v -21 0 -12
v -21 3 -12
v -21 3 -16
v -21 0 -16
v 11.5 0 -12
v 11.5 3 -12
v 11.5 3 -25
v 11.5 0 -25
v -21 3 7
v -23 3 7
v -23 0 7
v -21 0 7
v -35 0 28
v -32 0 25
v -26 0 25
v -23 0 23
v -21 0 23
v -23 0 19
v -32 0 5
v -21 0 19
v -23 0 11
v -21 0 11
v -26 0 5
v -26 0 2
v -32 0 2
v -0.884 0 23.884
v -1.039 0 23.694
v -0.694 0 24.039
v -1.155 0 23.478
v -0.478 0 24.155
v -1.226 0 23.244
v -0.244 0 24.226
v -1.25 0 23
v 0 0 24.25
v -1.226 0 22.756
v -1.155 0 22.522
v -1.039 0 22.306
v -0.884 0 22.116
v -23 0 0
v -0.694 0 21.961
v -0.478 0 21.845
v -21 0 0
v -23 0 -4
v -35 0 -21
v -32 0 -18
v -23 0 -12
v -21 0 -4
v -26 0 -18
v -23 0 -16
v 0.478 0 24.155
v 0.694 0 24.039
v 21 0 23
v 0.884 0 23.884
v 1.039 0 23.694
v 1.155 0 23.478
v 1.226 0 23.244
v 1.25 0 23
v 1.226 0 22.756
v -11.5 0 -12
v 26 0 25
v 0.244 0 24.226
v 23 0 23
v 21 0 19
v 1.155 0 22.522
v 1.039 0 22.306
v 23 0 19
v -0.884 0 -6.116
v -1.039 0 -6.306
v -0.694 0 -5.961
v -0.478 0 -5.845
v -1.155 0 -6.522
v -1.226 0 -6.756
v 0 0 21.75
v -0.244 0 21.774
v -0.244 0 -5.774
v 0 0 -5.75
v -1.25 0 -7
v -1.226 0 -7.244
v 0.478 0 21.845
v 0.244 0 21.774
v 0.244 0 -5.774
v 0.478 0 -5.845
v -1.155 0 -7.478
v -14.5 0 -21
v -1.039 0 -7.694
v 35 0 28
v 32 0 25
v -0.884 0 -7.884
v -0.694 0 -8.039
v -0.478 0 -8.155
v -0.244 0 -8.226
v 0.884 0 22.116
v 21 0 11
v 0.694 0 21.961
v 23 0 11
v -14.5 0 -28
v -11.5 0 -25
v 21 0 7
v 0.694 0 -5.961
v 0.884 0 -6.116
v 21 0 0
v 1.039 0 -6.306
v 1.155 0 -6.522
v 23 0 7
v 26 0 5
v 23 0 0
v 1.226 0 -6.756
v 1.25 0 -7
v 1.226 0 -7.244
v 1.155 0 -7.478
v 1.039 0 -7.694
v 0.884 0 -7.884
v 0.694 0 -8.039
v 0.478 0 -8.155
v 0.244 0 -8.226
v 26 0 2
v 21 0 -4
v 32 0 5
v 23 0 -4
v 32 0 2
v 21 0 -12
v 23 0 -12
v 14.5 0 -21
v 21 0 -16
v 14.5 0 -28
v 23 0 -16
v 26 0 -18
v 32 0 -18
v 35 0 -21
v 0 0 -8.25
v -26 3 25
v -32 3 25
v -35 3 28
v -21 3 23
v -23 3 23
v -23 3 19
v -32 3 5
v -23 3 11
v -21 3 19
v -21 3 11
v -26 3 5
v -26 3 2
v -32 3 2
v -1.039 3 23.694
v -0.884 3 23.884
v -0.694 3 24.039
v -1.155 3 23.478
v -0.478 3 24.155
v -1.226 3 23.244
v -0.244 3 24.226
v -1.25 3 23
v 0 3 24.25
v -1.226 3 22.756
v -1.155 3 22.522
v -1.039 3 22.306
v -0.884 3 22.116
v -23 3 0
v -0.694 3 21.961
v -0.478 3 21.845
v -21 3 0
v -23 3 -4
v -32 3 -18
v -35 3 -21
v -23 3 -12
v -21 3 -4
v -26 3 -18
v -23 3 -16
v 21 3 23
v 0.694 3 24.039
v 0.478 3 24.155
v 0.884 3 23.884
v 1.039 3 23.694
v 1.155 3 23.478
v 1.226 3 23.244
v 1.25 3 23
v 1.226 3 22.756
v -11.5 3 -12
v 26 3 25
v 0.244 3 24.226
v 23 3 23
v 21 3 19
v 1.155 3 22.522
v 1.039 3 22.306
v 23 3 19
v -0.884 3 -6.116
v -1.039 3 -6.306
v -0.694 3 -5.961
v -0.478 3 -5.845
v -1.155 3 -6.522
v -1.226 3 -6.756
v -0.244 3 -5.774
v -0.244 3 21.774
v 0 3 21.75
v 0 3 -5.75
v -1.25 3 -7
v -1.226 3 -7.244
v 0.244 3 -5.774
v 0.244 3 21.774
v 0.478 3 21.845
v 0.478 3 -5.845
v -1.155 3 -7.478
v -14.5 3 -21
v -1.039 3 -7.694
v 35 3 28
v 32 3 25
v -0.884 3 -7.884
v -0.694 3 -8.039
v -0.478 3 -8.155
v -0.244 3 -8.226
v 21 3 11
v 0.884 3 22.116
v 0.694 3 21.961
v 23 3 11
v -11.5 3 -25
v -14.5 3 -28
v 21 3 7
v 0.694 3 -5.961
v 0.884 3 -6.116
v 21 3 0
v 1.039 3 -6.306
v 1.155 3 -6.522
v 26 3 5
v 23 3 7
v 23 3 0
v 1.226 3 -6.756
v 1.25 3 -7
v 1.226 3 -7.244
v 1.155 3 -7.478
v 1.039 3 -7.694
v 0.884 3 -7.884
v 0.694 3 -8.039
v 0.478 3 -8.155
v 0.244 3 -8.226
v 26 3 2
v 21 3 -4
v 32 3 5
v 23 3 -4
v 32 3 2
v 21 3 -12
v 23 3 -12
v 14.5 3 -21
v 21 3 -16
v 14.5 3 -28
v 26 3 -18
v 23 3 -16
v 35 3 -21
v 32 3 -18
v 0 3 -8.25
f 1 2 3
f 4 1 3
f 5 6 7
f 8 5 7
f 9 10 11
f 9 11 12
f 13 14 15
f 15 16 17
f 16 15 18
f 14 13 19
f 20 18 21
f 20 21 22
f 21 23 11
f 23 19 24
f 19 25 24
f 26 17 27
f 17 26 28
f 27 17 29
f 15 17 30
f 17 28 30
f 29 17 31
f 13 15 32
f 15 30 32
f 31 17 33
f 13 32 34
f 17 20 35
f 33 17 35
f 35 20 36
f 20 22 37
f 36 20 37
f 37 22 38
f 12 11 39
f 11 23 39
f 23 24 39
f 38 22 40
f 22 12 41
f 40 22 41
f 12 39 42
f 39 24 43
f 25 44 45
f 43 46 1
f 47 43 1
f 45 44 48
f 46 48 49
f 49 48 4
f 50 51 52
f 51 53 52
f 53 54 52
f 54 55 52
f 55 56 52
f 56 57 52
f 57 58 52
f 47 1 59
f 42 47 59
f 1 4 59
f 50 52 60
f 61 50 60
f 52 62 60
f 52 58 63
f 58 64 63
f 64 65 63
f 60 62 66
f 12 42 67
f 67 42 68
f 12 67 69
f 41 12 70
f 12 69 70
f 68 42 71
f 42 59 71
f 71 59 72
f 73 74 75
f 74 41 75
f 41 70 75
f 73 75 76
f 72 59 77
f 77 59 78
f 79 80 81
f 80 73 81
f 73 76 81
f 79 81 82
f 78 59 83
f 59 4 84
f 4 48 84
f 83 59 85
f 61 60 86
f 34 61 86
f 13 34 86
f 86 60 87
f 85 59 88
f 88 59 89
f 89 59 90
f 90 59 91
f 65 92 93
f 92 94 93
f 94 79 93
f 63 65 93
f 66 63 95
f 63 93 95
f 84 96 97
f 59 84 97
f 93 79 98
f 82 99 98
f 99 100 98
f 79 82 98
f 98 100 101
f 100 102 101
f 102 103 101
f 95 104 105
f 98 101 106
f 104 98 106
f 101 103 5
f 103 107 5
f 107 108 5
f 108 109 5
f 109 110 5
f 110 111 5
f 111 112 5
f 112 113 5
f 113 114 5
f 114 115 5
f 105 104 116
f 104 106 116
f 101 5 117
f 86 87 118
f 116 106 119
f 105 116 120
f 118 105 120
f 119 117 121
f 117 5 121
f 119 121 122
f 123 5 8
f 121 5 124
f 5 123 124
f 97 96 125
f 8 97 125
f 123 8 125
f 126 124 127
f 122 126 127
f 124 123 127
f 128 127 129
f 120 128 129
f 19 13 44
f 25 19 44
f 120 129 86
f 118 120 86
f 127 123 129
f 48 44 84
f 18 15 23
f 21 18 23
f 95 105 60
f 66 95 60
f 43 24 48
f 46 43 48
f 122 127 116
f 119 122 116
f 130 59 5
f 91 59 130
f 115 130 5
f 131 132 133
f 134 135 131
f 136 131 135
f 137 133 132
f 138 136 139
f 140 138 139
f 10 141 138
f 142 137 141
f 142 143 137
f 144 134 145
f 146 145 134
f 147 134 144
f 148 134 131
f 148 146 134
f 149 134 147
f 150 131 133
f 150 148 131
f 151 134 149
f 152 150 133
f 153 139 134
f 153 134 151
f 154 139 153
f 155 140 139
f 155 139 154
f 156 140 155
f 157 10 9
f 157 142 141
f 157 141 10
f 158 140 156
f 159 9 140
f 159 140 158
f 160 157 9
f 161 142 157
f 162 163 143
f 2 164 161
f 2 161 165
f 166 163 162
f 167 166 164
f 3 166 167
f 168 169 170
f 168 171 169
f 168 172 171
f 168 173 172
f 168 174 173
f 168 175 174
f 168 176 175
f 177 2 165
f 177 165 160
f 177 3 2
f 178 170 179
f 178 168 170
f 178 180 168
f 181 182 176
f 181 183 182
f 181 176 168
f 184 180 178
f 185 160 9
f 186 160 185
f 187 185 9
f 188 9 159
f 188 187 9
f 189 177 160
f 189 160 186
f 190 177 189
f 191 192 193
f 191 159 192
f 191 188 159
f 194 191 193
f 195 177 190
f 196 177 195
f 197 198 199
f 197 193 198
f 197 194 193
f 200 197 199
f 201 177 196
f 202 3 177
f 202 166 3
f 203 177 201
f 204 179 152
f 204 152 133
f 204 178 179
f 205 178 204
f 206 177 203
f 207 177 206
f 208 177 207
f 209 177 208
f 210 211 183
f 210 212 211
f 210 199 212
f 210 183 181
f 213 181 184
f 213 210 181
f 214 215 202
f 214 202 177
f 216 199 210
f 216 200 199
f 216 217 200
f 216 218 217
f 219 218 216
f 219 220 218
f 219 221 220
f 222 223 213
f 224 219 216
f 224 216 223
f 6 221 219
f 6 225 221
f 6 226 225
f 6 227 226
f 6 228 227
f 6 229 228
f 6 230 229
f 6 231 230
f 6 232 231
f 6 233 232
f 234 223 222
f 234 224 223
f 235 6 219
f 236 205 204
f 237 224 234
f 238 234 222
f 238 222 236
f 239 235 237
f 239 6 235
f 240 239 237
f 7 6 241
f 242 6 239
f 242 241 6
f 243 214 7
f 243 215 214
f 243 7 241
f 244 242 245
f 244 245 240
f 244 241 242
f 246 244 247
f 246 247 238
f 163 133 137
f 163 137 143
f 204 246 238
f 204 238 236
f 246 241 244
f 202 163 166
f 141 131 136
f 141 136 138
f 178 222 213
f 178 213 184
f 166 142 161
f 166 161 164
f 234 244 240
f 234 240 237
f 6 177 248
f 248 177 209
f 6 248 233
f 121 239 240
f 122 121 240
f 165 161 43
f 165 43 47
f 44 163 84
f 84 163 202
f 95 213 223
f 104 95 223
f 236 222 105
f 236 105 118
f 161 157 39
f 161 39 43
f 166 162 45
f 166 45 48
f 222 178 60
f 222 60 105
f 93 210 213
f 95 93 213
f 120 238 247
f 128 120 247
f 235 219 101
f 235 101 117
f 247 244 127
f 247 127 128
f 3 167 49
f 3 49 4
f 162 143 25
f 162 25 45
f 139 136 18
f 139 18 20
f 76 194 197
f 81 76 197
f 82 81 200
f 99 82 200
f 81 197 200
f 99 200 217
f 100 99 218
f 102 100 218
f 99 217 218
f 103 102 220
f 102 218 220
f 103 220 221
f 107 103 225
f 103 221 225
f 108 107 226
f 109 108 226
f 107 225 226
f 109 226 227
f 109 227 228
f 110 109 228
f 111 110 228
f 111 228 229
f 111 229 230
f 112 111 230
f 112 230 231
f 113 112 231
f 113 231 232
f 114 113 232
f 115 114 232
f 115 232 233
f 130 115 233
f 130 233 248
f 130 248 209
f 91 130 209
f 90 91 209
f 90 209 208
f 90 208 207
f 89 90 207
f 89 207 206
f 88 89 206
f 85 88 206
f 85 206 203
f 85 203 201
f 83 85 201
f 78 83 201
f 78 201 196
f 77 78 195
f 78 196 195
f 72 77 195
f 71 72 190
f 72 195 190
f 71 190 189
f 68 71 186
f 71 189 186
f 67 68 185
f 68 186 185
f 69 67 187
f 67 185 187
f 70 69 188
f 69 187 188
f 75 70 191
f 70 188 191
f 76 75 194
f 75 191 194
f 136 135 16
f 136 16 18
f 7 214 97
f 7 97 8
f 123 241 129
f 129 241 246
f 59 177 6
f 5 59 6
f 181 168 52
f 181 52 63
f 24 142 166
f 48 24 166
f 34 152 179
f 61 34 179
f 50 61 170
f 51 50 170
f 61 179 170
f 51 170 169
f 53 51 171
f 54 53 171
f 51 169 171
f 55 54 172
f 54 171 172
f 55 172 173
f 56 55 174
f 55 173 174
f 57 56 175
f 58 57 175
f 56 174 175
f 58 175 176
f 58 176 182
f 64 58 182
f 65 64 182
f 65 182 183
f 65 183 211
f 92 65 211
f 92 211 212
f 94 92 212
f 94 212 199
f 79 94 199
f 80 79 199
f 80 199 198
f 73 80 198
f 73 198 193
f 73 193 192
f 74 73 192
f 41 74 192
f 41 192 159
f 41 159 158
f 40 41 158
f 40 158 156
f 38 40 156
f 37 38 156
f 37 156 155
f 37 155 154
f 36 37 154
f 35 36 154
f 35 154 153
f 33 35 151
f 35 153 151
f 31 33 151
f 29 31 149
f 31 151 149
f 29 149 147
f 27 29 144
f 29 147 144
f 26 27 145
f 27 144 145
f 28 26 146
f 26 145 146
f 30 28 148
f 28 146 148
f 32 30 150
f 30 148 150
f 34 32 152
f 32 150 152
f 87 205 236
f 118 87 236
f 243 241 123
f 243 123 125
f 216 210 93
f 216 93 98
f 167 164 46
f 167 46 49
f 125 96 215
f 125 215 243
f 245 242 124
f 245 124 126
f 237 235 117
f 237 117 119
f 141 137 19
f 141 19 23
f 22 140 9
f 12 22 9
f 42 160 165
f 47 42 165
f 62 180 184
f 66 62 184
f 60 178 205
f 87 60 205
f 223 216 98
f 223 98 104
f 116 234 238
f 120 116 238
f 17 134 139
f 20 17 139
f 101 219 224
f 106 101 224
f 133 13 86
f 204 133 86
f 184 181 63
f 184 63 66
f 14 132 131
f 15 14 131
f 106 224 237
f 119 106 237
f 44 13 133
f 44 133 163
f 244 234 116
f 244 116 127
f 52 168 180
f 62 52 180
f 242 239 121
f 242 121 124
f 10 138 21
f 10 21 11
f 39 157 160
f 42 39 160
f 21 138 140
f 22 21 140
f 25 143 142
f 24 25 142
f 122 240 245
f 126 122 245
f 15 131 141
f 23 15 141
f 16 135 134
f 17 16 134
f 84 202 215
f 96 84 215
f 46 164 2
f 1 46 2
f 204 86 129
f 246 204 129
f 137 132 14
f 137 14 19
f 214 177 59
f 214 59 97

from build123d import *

# Parameters (mm, degrees)
SKETCH_1_W          = 70
SKETCH_1_H          = 56
EXTRUDE_1_DEPTH     = 3
CUT_EXTRUDE_1_REACH = 46.922
SKETCH_2_R          = 1.25
SKETCH_2_W          = 23
SKETCH_2_H          = 13
SKETCH_2_W_2        = 6
SKETCH_2_H_2        = 20
SKETCH_2_W_3        = 2
SKETCH_2_H_3        = 4
SKETCH_2_W_4        = 20.5
SKETCH_2_H_4        = 7


with BuildPart() as part:
    # 草图1 → 凸台-拉伸1 (new body)
    with BuildSketch(Plane(origin=(0, 0, 0), x_dir=(1, 0, 0), z_dir=(0, 1, 0))):
        Rectangle(SKETCH_1_W, SKETCH_1_H)
    extrude(amount=EXTRUDE_1_DEPTH)

    # 草图2 → 切除-拉伸1 (cut, up to next)
    with BuildSketch(Plane(origin=(0, 3, 0), x_dir=(1, 0, 0), z_dir=(0, 1, 0)), mode=Mode.PRIVATE) as cut_extrude_1_sk1:
        with Locations(Location((0, 7, 0), (0, 0, 270))):
            Circle(SKETCH_2_R)
    cut_extrude_1_tool1 = extrude(cut_extrude_1_sk1.sketch, amount=-CUT_EXTRUDE_1_REACH, mode=Mode.PRIVATE) & part.part
    # 草图2 → 切除-拉伸1 (cut, up to next)
    with BuildSketch(Plane(origin=(0, 3, 0), x_dir=(1, 0, 0), z_dir=(0, 1, 0)), mode=Mode.PRIVATE) as cut_extrude_1_sk2:
        with Locations(Location((0, -23, 0), (0, 0, 270))):
            Circle(SKETCH_2_R)
    cut_extrude_1_tool2 = extrude(cut_extrude_1_sk2.sketch, amount=-CUT_EXTRUDE_1_REACH, mode=Mode.PRIVATE) & part.part
    # 草图2 → 切除-拉伸1 (cut, up to next)
    with BuildSketch(Plane(origin=(0, 3, 0), x_dir=(1, 0, 0), z_dir=(0, 1, 0)), mode=Mode.PRIVATE) as cut_extrude_1_sk3:
        with Locations((0, 18.5)):
            Rectangle(SKETCH_2_W, SKETCH_2_H)
    cut_extrude_1_tool3 = extrude(cut_extrude_1_sk3.sketch, amount=-CUT_EXTRUDE_1_REACH, mode=Mode.PRIVATE) & part.part
    # 草图2 → 切除-拉伸1 (cut, up to next)
    with BuildSketch(Plane(origin=(0, 3, 0), x_dir=(1, 0, 0), z_dir=(0, 1, 0)), mode=Mode.PRIVATE) as cut_extrude_1_sk4:
        with Locations((-29, -15)):
            Rectangle(SKETCH_2_W_2, SKETCH_2_H_2)
    cut_extrude_1_tool4 = extrude(cut_extrude_1_sk4.sketch, amount=-CUT_EXTRUDE_1_REACH, mode=Mode.PRIVATE) & part.part
    # 草图2 → 切除-拉伸1 (cut, up to next)
    with BuildSketch(Plane(origin=(0, 3, 0), x_dir=(1, 0, 0), z_dir=(0, 1, 0)), mode=Mode.PRIVATE) as cut_extrude_1_sk5:
        with Locations((-29, 8)):
            Rectangle(SKETCH_2_W_2, SKETCH_2_H_2)
    cut_extrude_1_tool5 = extrude(cut_extrude_1_sk5.sketch, amount=-CUT_EXTRUDE_1_REACH, mode=Mode.PRIVATE) & part.part
    # 草图2 → 切除-拉伸1 (cut, up to next)
    with BuildSketch(Plane(origin=(0, 3, 0), x_dir=(1, 0, 0), z_dir=(0, 1, 0)), mode=Mode.PRIVATE) as cut_extrude_1_sk6:
        with Locations((29, -15)):
            Rectangle(SKETCH_2_W_2, SKETCH_2_H_2)
    cut_extrude_1_tool6 = extrude(cut_extrude_1_sk6.sketch, amount=-CUT_EXTRUDE_1_REACH, mode=Mode.PRIVATE) & part.part
    # 草图2 → 切除-拉伸1 (cut, up to next)
    with BuildSketch(Plane(origin=(0, 3, 0), x_dir=(1, 0, 0), z_dir=(0, 1, 0)), mode=Mode.PRIVATE) as cut_extrude_1_sk7:
        with Locations((29, 8)):
            Rectangle(SKETCH_2_W_2, SKETCH_2_H_2)
    cut_extrude_1_tool7 = extrude(cut_extrude_1_sk7.sketch, amount=-CUT_EXTRUDE_1_REACH, mode=Mode.PRIVATE) & part.part
    # 草图2 → 切除-拉伸1 (cut, up to next)
    with BuildSketch(Plane(origin=(0, 3, 0), x_dir=(1, 0, 0), z_dir=(0, 1, 0)), mode=Mode.PRIVATE) as cut_extrude_1_sk8:
        with Locations((-22, 2)):
            Rectangle(SKETCH_2_W_3, SKETCH_2_H_3)
    cut_extrude_1_tool8 = extrude(cut_extrude_1_sk8.sketch, amount=-CUT_EXTRUDE_1_REACH, mode=Mode.PRIVATE) & part.part
    # 草图2 → 切除-拉伸1 (cut, up to next)
    with BuildSketch(Plane(origin=(0, 3, 0), x_dir=(1, 0, 0), z_dir=(0, 1, 0)), mode=Mode.PRIVATE) as cut_extrude_1_sk9:
        with Locations((-22, 14)):
            Rectangle(SKETCH_2_W_3, SKETCH_2_H_3)
    cut_extrude_1_tool9 = extrude(cut_extrude_1_sk9.sketch, amount=-CUT_EXTRUDE_1_REACH, mode=Mode.PRIVATE) & part.part
    # 草图2 → 切除-拉伸1 (cut, up to next)
    with BuildSketch(Plane(origin=(0, 3, 0), x_dir=(1, 0, 0), z_dir=(0, 1, 0)), mode=Mode.PRIVATE) as cut_extrude_1_sk10:
        with Locations((22, 2)):
            Rectangle(SKETCH_2_W_3, SKETCH_2_H_3)
    cut_extrude_1_tool10 = extrude(cut_extrude_1_sk10.sketch, amount=-CUT_EXTRUDE_1_REACH, mode=Mode.PRIVATE) & part.part
    # 草图2 → 切除-拉伸1 (cut, up to next)
    with BuildSketch(Plane(origin=(0, 3, 0), x_dir=(1, 0, 0), z_dir=(0, 1, 0)), mode=Mode.PRIVATE) as cut_extrude_1_sk11:
        with Locations((22, 14)):
            Rectangle(SKETCH_2_W_3, SKETCH_2_H_3)
    cut_extrude_1_tool11 = extrude(cut_extrude_1_sk11.sketch, amount=-CUT_EXTRUDE_1_REACH, mode=Mode.PRIVATE) & part.part
    # 草图2 → 切除-拉伸1 (cut, up to next)
    with BuildSketch(Plane(origin=(0, 3, 0), x_dir=(1, 0, 0), z_dir=(0, 1, 0)), mode=Mode.PRIVATE) as cut_extrude_1_sk12:
        with Locations((24.75, 24.5)):
            Rectangle(SKETCH_2_W_4, SKETCH_2_H_4)
    cut_extrude_1_tool12 = extrude(cut_extrude_1_sk12.sketch, amount=-CUT_EXTRUDE_1_REACH, mode=Mode.PRIVATE) & part.part
    # 草图2 → 切除-拉伸1 (cut, up to next)
    with BuildSketch(Plane(origin=(0, 3, 0), x_dir=(1, 0, 0), z_dir=(0, 1, 0)), mode=Mode.PRIVATE) as cut_extrude_1_sk13:
        with Locations((-24.75, 24.5)):
            Rectangle(SKETCH_2_W_4, SKETCH_2_H_4)
    cut_extrude_1_tool13 = extrude(cut_extrude_1_sk13.sketch, amount=-CUT_EXTRUDE_1_REACH, mode=Mode.PRIVATE) & part.part
    # 草图2 → 切除-拉伸1 (cut, up to next)
    with BuildSketch(Plane(origin=(0, 3, 0), x_dir=(1, 0, 0), z_dir=(0, 1, 0)), mode=Mode.PRIVATE) as cut_extrude_1_sk14:
        with Locations((-22, -9)):
            Rectangle(SKETCH_2_W_3, SKETCH_2_H_3)
    cut_extrude_1_tool14 = extrude(cut_extrude_1_sk14.sketch, amount=-CUT_EXTRUDE_1_REACH, mode=Mode.PRIVATE) & part.part
    # 草图2 → 切除-拉伸1 (cut, up to next)
    with BuildSketch(Plane(origin=(0, 3, 0), x_dir=(1, 0, 0), z_dir=(0, 1, 0)), mode=Mode.PRIVATE) as cut_extrude_1_sk15:
        with Locations((-22, -21)):
            Rectangle(SKETCH_2_W_3, SKETCH_2_H_3)
    cut_extrude_1_tool15 = extrude(cut_extrude_1_sk15.sketch, amount=-CUT_EXTRUDE_1_REACH, mode=Mode.PRIVATE) & part.part
    # 草图2 → 切除-拉伸1 (cut, up to next)
    with BuildSketch(Plane(origin=(0, 3, 0), x_dir=(1, 0, 0), z_dir=(0, 1, 0)), mode=Mode.PRIVATE) as cut_extrude_1_sk16:
        with Locations((22, -21)):
            Rectangle(SKETCH_2_W_3, SKETCH_2_H_3)
    cut_extrude_1_tool16 = extrude(cut_extrude_1_sk16.sketch, amount=-CUT_EXTRUDE_1_REACH, mode=Mode.PRIVATE) & part.part
    # 草图2 → 切除-拉伸1 (cut, up to next)
    with BuildSketch(Plane(origin=(0, 3, 0), x_dir=(1, 0, 0), z_dir=(0, 1, 0)), mode=Mode.PRIVATE) as cut_extrude_1_sk17:
        with Locations((22, -9)):
            Rectangle(SKETCH_2_W_3, SKETCH_2_H_3)
    cut_extrude_1_tool17 = extrude(cut_extrude_1_sk17.sketch, amount=-CUT_EXTRUDE_1_REACH, mode=Mode.PRIVATE) & part.part
    add(cut_extrude_1_tool1.solids().sort_by_distance((0, 3, -7))[0], mode=Mode.SUBTRACT)
    add(cut_extrude_1_tool2.solids().sort_by_distance((0, 3, 23))[0], mode=Mode.SUBTRACT)
    add(cut_extrude_1_tool3.solids().sort_by_distance((0, 3, -18.5))[0], mode=Mode.SUBTRACT)
    add(cut_extrude_1_tool4.solids().sort_by_distance((-29, 3, 15))[0], mode=Mode.SUBTRACT)
    add(cut_extrude_1_tool5.solids().sort_by_distance((-29, 3, -8))[0], mode=Mode.SUBTRACT)
    add(cut_extrude_1_tool6.solids().sort_by_distance((29, 3, 15))[0], mode=Mode.SUBTRACT)
    add(cut_extrude_1_tool7.solids().sort_by_distance((29, 3, -8))[0], mode=Mode.SUBTRACT)
    add(cut_extrude_1_tool8.solids().sort_by_distance((-22, 3, -2))[0], mode=Mode.SUBTRACT)
    add(cut_extrude_1_tool9.solids().sort_by_distance((-22, 3, -14))[0], mode=Mode.SUBTRACT)
    add(cut_extrude_1_tool10.solids().sort_by_distance((22, 3, -2))[0], mode=Mode.SUBTRACT)
    add(cut_extrude_1_tool11.solids().sort_by_distance((22, 3, -14))[0], mode=Mode.SUBTRACT)
    add(cut_extrude_1_tool12.solids().sort_by_distance((24.75, 3, -24.5))[0], mode=Mode.SUBTRACT)
    add(cut_extrude_1_tool13.solids().sort_by_distance((-24.75, 3, -24.5))[0], mode=Mode.SUBTRACT)
    add(cut_extrude_1_tool14.solids().sort_by_distance((-22, 3, 9))[0], mode=Mode.SUBTRACT)
    add(cut_extrude_1_tool15.solids().sort_by_distance((-22, 3, 21))[0], mode=Mode.SUBTRACT)
    add(cut_extrude_1_tool16.solids().sort_by_distance((22, 3, 21))[0], mode=Mode.SUBTRACT)
    add(cut_extrude_1_tool17.solids().sort_by_distance((22, 3, 9))[0], mode=Mode.SUBTRACT)


solid = part.part
